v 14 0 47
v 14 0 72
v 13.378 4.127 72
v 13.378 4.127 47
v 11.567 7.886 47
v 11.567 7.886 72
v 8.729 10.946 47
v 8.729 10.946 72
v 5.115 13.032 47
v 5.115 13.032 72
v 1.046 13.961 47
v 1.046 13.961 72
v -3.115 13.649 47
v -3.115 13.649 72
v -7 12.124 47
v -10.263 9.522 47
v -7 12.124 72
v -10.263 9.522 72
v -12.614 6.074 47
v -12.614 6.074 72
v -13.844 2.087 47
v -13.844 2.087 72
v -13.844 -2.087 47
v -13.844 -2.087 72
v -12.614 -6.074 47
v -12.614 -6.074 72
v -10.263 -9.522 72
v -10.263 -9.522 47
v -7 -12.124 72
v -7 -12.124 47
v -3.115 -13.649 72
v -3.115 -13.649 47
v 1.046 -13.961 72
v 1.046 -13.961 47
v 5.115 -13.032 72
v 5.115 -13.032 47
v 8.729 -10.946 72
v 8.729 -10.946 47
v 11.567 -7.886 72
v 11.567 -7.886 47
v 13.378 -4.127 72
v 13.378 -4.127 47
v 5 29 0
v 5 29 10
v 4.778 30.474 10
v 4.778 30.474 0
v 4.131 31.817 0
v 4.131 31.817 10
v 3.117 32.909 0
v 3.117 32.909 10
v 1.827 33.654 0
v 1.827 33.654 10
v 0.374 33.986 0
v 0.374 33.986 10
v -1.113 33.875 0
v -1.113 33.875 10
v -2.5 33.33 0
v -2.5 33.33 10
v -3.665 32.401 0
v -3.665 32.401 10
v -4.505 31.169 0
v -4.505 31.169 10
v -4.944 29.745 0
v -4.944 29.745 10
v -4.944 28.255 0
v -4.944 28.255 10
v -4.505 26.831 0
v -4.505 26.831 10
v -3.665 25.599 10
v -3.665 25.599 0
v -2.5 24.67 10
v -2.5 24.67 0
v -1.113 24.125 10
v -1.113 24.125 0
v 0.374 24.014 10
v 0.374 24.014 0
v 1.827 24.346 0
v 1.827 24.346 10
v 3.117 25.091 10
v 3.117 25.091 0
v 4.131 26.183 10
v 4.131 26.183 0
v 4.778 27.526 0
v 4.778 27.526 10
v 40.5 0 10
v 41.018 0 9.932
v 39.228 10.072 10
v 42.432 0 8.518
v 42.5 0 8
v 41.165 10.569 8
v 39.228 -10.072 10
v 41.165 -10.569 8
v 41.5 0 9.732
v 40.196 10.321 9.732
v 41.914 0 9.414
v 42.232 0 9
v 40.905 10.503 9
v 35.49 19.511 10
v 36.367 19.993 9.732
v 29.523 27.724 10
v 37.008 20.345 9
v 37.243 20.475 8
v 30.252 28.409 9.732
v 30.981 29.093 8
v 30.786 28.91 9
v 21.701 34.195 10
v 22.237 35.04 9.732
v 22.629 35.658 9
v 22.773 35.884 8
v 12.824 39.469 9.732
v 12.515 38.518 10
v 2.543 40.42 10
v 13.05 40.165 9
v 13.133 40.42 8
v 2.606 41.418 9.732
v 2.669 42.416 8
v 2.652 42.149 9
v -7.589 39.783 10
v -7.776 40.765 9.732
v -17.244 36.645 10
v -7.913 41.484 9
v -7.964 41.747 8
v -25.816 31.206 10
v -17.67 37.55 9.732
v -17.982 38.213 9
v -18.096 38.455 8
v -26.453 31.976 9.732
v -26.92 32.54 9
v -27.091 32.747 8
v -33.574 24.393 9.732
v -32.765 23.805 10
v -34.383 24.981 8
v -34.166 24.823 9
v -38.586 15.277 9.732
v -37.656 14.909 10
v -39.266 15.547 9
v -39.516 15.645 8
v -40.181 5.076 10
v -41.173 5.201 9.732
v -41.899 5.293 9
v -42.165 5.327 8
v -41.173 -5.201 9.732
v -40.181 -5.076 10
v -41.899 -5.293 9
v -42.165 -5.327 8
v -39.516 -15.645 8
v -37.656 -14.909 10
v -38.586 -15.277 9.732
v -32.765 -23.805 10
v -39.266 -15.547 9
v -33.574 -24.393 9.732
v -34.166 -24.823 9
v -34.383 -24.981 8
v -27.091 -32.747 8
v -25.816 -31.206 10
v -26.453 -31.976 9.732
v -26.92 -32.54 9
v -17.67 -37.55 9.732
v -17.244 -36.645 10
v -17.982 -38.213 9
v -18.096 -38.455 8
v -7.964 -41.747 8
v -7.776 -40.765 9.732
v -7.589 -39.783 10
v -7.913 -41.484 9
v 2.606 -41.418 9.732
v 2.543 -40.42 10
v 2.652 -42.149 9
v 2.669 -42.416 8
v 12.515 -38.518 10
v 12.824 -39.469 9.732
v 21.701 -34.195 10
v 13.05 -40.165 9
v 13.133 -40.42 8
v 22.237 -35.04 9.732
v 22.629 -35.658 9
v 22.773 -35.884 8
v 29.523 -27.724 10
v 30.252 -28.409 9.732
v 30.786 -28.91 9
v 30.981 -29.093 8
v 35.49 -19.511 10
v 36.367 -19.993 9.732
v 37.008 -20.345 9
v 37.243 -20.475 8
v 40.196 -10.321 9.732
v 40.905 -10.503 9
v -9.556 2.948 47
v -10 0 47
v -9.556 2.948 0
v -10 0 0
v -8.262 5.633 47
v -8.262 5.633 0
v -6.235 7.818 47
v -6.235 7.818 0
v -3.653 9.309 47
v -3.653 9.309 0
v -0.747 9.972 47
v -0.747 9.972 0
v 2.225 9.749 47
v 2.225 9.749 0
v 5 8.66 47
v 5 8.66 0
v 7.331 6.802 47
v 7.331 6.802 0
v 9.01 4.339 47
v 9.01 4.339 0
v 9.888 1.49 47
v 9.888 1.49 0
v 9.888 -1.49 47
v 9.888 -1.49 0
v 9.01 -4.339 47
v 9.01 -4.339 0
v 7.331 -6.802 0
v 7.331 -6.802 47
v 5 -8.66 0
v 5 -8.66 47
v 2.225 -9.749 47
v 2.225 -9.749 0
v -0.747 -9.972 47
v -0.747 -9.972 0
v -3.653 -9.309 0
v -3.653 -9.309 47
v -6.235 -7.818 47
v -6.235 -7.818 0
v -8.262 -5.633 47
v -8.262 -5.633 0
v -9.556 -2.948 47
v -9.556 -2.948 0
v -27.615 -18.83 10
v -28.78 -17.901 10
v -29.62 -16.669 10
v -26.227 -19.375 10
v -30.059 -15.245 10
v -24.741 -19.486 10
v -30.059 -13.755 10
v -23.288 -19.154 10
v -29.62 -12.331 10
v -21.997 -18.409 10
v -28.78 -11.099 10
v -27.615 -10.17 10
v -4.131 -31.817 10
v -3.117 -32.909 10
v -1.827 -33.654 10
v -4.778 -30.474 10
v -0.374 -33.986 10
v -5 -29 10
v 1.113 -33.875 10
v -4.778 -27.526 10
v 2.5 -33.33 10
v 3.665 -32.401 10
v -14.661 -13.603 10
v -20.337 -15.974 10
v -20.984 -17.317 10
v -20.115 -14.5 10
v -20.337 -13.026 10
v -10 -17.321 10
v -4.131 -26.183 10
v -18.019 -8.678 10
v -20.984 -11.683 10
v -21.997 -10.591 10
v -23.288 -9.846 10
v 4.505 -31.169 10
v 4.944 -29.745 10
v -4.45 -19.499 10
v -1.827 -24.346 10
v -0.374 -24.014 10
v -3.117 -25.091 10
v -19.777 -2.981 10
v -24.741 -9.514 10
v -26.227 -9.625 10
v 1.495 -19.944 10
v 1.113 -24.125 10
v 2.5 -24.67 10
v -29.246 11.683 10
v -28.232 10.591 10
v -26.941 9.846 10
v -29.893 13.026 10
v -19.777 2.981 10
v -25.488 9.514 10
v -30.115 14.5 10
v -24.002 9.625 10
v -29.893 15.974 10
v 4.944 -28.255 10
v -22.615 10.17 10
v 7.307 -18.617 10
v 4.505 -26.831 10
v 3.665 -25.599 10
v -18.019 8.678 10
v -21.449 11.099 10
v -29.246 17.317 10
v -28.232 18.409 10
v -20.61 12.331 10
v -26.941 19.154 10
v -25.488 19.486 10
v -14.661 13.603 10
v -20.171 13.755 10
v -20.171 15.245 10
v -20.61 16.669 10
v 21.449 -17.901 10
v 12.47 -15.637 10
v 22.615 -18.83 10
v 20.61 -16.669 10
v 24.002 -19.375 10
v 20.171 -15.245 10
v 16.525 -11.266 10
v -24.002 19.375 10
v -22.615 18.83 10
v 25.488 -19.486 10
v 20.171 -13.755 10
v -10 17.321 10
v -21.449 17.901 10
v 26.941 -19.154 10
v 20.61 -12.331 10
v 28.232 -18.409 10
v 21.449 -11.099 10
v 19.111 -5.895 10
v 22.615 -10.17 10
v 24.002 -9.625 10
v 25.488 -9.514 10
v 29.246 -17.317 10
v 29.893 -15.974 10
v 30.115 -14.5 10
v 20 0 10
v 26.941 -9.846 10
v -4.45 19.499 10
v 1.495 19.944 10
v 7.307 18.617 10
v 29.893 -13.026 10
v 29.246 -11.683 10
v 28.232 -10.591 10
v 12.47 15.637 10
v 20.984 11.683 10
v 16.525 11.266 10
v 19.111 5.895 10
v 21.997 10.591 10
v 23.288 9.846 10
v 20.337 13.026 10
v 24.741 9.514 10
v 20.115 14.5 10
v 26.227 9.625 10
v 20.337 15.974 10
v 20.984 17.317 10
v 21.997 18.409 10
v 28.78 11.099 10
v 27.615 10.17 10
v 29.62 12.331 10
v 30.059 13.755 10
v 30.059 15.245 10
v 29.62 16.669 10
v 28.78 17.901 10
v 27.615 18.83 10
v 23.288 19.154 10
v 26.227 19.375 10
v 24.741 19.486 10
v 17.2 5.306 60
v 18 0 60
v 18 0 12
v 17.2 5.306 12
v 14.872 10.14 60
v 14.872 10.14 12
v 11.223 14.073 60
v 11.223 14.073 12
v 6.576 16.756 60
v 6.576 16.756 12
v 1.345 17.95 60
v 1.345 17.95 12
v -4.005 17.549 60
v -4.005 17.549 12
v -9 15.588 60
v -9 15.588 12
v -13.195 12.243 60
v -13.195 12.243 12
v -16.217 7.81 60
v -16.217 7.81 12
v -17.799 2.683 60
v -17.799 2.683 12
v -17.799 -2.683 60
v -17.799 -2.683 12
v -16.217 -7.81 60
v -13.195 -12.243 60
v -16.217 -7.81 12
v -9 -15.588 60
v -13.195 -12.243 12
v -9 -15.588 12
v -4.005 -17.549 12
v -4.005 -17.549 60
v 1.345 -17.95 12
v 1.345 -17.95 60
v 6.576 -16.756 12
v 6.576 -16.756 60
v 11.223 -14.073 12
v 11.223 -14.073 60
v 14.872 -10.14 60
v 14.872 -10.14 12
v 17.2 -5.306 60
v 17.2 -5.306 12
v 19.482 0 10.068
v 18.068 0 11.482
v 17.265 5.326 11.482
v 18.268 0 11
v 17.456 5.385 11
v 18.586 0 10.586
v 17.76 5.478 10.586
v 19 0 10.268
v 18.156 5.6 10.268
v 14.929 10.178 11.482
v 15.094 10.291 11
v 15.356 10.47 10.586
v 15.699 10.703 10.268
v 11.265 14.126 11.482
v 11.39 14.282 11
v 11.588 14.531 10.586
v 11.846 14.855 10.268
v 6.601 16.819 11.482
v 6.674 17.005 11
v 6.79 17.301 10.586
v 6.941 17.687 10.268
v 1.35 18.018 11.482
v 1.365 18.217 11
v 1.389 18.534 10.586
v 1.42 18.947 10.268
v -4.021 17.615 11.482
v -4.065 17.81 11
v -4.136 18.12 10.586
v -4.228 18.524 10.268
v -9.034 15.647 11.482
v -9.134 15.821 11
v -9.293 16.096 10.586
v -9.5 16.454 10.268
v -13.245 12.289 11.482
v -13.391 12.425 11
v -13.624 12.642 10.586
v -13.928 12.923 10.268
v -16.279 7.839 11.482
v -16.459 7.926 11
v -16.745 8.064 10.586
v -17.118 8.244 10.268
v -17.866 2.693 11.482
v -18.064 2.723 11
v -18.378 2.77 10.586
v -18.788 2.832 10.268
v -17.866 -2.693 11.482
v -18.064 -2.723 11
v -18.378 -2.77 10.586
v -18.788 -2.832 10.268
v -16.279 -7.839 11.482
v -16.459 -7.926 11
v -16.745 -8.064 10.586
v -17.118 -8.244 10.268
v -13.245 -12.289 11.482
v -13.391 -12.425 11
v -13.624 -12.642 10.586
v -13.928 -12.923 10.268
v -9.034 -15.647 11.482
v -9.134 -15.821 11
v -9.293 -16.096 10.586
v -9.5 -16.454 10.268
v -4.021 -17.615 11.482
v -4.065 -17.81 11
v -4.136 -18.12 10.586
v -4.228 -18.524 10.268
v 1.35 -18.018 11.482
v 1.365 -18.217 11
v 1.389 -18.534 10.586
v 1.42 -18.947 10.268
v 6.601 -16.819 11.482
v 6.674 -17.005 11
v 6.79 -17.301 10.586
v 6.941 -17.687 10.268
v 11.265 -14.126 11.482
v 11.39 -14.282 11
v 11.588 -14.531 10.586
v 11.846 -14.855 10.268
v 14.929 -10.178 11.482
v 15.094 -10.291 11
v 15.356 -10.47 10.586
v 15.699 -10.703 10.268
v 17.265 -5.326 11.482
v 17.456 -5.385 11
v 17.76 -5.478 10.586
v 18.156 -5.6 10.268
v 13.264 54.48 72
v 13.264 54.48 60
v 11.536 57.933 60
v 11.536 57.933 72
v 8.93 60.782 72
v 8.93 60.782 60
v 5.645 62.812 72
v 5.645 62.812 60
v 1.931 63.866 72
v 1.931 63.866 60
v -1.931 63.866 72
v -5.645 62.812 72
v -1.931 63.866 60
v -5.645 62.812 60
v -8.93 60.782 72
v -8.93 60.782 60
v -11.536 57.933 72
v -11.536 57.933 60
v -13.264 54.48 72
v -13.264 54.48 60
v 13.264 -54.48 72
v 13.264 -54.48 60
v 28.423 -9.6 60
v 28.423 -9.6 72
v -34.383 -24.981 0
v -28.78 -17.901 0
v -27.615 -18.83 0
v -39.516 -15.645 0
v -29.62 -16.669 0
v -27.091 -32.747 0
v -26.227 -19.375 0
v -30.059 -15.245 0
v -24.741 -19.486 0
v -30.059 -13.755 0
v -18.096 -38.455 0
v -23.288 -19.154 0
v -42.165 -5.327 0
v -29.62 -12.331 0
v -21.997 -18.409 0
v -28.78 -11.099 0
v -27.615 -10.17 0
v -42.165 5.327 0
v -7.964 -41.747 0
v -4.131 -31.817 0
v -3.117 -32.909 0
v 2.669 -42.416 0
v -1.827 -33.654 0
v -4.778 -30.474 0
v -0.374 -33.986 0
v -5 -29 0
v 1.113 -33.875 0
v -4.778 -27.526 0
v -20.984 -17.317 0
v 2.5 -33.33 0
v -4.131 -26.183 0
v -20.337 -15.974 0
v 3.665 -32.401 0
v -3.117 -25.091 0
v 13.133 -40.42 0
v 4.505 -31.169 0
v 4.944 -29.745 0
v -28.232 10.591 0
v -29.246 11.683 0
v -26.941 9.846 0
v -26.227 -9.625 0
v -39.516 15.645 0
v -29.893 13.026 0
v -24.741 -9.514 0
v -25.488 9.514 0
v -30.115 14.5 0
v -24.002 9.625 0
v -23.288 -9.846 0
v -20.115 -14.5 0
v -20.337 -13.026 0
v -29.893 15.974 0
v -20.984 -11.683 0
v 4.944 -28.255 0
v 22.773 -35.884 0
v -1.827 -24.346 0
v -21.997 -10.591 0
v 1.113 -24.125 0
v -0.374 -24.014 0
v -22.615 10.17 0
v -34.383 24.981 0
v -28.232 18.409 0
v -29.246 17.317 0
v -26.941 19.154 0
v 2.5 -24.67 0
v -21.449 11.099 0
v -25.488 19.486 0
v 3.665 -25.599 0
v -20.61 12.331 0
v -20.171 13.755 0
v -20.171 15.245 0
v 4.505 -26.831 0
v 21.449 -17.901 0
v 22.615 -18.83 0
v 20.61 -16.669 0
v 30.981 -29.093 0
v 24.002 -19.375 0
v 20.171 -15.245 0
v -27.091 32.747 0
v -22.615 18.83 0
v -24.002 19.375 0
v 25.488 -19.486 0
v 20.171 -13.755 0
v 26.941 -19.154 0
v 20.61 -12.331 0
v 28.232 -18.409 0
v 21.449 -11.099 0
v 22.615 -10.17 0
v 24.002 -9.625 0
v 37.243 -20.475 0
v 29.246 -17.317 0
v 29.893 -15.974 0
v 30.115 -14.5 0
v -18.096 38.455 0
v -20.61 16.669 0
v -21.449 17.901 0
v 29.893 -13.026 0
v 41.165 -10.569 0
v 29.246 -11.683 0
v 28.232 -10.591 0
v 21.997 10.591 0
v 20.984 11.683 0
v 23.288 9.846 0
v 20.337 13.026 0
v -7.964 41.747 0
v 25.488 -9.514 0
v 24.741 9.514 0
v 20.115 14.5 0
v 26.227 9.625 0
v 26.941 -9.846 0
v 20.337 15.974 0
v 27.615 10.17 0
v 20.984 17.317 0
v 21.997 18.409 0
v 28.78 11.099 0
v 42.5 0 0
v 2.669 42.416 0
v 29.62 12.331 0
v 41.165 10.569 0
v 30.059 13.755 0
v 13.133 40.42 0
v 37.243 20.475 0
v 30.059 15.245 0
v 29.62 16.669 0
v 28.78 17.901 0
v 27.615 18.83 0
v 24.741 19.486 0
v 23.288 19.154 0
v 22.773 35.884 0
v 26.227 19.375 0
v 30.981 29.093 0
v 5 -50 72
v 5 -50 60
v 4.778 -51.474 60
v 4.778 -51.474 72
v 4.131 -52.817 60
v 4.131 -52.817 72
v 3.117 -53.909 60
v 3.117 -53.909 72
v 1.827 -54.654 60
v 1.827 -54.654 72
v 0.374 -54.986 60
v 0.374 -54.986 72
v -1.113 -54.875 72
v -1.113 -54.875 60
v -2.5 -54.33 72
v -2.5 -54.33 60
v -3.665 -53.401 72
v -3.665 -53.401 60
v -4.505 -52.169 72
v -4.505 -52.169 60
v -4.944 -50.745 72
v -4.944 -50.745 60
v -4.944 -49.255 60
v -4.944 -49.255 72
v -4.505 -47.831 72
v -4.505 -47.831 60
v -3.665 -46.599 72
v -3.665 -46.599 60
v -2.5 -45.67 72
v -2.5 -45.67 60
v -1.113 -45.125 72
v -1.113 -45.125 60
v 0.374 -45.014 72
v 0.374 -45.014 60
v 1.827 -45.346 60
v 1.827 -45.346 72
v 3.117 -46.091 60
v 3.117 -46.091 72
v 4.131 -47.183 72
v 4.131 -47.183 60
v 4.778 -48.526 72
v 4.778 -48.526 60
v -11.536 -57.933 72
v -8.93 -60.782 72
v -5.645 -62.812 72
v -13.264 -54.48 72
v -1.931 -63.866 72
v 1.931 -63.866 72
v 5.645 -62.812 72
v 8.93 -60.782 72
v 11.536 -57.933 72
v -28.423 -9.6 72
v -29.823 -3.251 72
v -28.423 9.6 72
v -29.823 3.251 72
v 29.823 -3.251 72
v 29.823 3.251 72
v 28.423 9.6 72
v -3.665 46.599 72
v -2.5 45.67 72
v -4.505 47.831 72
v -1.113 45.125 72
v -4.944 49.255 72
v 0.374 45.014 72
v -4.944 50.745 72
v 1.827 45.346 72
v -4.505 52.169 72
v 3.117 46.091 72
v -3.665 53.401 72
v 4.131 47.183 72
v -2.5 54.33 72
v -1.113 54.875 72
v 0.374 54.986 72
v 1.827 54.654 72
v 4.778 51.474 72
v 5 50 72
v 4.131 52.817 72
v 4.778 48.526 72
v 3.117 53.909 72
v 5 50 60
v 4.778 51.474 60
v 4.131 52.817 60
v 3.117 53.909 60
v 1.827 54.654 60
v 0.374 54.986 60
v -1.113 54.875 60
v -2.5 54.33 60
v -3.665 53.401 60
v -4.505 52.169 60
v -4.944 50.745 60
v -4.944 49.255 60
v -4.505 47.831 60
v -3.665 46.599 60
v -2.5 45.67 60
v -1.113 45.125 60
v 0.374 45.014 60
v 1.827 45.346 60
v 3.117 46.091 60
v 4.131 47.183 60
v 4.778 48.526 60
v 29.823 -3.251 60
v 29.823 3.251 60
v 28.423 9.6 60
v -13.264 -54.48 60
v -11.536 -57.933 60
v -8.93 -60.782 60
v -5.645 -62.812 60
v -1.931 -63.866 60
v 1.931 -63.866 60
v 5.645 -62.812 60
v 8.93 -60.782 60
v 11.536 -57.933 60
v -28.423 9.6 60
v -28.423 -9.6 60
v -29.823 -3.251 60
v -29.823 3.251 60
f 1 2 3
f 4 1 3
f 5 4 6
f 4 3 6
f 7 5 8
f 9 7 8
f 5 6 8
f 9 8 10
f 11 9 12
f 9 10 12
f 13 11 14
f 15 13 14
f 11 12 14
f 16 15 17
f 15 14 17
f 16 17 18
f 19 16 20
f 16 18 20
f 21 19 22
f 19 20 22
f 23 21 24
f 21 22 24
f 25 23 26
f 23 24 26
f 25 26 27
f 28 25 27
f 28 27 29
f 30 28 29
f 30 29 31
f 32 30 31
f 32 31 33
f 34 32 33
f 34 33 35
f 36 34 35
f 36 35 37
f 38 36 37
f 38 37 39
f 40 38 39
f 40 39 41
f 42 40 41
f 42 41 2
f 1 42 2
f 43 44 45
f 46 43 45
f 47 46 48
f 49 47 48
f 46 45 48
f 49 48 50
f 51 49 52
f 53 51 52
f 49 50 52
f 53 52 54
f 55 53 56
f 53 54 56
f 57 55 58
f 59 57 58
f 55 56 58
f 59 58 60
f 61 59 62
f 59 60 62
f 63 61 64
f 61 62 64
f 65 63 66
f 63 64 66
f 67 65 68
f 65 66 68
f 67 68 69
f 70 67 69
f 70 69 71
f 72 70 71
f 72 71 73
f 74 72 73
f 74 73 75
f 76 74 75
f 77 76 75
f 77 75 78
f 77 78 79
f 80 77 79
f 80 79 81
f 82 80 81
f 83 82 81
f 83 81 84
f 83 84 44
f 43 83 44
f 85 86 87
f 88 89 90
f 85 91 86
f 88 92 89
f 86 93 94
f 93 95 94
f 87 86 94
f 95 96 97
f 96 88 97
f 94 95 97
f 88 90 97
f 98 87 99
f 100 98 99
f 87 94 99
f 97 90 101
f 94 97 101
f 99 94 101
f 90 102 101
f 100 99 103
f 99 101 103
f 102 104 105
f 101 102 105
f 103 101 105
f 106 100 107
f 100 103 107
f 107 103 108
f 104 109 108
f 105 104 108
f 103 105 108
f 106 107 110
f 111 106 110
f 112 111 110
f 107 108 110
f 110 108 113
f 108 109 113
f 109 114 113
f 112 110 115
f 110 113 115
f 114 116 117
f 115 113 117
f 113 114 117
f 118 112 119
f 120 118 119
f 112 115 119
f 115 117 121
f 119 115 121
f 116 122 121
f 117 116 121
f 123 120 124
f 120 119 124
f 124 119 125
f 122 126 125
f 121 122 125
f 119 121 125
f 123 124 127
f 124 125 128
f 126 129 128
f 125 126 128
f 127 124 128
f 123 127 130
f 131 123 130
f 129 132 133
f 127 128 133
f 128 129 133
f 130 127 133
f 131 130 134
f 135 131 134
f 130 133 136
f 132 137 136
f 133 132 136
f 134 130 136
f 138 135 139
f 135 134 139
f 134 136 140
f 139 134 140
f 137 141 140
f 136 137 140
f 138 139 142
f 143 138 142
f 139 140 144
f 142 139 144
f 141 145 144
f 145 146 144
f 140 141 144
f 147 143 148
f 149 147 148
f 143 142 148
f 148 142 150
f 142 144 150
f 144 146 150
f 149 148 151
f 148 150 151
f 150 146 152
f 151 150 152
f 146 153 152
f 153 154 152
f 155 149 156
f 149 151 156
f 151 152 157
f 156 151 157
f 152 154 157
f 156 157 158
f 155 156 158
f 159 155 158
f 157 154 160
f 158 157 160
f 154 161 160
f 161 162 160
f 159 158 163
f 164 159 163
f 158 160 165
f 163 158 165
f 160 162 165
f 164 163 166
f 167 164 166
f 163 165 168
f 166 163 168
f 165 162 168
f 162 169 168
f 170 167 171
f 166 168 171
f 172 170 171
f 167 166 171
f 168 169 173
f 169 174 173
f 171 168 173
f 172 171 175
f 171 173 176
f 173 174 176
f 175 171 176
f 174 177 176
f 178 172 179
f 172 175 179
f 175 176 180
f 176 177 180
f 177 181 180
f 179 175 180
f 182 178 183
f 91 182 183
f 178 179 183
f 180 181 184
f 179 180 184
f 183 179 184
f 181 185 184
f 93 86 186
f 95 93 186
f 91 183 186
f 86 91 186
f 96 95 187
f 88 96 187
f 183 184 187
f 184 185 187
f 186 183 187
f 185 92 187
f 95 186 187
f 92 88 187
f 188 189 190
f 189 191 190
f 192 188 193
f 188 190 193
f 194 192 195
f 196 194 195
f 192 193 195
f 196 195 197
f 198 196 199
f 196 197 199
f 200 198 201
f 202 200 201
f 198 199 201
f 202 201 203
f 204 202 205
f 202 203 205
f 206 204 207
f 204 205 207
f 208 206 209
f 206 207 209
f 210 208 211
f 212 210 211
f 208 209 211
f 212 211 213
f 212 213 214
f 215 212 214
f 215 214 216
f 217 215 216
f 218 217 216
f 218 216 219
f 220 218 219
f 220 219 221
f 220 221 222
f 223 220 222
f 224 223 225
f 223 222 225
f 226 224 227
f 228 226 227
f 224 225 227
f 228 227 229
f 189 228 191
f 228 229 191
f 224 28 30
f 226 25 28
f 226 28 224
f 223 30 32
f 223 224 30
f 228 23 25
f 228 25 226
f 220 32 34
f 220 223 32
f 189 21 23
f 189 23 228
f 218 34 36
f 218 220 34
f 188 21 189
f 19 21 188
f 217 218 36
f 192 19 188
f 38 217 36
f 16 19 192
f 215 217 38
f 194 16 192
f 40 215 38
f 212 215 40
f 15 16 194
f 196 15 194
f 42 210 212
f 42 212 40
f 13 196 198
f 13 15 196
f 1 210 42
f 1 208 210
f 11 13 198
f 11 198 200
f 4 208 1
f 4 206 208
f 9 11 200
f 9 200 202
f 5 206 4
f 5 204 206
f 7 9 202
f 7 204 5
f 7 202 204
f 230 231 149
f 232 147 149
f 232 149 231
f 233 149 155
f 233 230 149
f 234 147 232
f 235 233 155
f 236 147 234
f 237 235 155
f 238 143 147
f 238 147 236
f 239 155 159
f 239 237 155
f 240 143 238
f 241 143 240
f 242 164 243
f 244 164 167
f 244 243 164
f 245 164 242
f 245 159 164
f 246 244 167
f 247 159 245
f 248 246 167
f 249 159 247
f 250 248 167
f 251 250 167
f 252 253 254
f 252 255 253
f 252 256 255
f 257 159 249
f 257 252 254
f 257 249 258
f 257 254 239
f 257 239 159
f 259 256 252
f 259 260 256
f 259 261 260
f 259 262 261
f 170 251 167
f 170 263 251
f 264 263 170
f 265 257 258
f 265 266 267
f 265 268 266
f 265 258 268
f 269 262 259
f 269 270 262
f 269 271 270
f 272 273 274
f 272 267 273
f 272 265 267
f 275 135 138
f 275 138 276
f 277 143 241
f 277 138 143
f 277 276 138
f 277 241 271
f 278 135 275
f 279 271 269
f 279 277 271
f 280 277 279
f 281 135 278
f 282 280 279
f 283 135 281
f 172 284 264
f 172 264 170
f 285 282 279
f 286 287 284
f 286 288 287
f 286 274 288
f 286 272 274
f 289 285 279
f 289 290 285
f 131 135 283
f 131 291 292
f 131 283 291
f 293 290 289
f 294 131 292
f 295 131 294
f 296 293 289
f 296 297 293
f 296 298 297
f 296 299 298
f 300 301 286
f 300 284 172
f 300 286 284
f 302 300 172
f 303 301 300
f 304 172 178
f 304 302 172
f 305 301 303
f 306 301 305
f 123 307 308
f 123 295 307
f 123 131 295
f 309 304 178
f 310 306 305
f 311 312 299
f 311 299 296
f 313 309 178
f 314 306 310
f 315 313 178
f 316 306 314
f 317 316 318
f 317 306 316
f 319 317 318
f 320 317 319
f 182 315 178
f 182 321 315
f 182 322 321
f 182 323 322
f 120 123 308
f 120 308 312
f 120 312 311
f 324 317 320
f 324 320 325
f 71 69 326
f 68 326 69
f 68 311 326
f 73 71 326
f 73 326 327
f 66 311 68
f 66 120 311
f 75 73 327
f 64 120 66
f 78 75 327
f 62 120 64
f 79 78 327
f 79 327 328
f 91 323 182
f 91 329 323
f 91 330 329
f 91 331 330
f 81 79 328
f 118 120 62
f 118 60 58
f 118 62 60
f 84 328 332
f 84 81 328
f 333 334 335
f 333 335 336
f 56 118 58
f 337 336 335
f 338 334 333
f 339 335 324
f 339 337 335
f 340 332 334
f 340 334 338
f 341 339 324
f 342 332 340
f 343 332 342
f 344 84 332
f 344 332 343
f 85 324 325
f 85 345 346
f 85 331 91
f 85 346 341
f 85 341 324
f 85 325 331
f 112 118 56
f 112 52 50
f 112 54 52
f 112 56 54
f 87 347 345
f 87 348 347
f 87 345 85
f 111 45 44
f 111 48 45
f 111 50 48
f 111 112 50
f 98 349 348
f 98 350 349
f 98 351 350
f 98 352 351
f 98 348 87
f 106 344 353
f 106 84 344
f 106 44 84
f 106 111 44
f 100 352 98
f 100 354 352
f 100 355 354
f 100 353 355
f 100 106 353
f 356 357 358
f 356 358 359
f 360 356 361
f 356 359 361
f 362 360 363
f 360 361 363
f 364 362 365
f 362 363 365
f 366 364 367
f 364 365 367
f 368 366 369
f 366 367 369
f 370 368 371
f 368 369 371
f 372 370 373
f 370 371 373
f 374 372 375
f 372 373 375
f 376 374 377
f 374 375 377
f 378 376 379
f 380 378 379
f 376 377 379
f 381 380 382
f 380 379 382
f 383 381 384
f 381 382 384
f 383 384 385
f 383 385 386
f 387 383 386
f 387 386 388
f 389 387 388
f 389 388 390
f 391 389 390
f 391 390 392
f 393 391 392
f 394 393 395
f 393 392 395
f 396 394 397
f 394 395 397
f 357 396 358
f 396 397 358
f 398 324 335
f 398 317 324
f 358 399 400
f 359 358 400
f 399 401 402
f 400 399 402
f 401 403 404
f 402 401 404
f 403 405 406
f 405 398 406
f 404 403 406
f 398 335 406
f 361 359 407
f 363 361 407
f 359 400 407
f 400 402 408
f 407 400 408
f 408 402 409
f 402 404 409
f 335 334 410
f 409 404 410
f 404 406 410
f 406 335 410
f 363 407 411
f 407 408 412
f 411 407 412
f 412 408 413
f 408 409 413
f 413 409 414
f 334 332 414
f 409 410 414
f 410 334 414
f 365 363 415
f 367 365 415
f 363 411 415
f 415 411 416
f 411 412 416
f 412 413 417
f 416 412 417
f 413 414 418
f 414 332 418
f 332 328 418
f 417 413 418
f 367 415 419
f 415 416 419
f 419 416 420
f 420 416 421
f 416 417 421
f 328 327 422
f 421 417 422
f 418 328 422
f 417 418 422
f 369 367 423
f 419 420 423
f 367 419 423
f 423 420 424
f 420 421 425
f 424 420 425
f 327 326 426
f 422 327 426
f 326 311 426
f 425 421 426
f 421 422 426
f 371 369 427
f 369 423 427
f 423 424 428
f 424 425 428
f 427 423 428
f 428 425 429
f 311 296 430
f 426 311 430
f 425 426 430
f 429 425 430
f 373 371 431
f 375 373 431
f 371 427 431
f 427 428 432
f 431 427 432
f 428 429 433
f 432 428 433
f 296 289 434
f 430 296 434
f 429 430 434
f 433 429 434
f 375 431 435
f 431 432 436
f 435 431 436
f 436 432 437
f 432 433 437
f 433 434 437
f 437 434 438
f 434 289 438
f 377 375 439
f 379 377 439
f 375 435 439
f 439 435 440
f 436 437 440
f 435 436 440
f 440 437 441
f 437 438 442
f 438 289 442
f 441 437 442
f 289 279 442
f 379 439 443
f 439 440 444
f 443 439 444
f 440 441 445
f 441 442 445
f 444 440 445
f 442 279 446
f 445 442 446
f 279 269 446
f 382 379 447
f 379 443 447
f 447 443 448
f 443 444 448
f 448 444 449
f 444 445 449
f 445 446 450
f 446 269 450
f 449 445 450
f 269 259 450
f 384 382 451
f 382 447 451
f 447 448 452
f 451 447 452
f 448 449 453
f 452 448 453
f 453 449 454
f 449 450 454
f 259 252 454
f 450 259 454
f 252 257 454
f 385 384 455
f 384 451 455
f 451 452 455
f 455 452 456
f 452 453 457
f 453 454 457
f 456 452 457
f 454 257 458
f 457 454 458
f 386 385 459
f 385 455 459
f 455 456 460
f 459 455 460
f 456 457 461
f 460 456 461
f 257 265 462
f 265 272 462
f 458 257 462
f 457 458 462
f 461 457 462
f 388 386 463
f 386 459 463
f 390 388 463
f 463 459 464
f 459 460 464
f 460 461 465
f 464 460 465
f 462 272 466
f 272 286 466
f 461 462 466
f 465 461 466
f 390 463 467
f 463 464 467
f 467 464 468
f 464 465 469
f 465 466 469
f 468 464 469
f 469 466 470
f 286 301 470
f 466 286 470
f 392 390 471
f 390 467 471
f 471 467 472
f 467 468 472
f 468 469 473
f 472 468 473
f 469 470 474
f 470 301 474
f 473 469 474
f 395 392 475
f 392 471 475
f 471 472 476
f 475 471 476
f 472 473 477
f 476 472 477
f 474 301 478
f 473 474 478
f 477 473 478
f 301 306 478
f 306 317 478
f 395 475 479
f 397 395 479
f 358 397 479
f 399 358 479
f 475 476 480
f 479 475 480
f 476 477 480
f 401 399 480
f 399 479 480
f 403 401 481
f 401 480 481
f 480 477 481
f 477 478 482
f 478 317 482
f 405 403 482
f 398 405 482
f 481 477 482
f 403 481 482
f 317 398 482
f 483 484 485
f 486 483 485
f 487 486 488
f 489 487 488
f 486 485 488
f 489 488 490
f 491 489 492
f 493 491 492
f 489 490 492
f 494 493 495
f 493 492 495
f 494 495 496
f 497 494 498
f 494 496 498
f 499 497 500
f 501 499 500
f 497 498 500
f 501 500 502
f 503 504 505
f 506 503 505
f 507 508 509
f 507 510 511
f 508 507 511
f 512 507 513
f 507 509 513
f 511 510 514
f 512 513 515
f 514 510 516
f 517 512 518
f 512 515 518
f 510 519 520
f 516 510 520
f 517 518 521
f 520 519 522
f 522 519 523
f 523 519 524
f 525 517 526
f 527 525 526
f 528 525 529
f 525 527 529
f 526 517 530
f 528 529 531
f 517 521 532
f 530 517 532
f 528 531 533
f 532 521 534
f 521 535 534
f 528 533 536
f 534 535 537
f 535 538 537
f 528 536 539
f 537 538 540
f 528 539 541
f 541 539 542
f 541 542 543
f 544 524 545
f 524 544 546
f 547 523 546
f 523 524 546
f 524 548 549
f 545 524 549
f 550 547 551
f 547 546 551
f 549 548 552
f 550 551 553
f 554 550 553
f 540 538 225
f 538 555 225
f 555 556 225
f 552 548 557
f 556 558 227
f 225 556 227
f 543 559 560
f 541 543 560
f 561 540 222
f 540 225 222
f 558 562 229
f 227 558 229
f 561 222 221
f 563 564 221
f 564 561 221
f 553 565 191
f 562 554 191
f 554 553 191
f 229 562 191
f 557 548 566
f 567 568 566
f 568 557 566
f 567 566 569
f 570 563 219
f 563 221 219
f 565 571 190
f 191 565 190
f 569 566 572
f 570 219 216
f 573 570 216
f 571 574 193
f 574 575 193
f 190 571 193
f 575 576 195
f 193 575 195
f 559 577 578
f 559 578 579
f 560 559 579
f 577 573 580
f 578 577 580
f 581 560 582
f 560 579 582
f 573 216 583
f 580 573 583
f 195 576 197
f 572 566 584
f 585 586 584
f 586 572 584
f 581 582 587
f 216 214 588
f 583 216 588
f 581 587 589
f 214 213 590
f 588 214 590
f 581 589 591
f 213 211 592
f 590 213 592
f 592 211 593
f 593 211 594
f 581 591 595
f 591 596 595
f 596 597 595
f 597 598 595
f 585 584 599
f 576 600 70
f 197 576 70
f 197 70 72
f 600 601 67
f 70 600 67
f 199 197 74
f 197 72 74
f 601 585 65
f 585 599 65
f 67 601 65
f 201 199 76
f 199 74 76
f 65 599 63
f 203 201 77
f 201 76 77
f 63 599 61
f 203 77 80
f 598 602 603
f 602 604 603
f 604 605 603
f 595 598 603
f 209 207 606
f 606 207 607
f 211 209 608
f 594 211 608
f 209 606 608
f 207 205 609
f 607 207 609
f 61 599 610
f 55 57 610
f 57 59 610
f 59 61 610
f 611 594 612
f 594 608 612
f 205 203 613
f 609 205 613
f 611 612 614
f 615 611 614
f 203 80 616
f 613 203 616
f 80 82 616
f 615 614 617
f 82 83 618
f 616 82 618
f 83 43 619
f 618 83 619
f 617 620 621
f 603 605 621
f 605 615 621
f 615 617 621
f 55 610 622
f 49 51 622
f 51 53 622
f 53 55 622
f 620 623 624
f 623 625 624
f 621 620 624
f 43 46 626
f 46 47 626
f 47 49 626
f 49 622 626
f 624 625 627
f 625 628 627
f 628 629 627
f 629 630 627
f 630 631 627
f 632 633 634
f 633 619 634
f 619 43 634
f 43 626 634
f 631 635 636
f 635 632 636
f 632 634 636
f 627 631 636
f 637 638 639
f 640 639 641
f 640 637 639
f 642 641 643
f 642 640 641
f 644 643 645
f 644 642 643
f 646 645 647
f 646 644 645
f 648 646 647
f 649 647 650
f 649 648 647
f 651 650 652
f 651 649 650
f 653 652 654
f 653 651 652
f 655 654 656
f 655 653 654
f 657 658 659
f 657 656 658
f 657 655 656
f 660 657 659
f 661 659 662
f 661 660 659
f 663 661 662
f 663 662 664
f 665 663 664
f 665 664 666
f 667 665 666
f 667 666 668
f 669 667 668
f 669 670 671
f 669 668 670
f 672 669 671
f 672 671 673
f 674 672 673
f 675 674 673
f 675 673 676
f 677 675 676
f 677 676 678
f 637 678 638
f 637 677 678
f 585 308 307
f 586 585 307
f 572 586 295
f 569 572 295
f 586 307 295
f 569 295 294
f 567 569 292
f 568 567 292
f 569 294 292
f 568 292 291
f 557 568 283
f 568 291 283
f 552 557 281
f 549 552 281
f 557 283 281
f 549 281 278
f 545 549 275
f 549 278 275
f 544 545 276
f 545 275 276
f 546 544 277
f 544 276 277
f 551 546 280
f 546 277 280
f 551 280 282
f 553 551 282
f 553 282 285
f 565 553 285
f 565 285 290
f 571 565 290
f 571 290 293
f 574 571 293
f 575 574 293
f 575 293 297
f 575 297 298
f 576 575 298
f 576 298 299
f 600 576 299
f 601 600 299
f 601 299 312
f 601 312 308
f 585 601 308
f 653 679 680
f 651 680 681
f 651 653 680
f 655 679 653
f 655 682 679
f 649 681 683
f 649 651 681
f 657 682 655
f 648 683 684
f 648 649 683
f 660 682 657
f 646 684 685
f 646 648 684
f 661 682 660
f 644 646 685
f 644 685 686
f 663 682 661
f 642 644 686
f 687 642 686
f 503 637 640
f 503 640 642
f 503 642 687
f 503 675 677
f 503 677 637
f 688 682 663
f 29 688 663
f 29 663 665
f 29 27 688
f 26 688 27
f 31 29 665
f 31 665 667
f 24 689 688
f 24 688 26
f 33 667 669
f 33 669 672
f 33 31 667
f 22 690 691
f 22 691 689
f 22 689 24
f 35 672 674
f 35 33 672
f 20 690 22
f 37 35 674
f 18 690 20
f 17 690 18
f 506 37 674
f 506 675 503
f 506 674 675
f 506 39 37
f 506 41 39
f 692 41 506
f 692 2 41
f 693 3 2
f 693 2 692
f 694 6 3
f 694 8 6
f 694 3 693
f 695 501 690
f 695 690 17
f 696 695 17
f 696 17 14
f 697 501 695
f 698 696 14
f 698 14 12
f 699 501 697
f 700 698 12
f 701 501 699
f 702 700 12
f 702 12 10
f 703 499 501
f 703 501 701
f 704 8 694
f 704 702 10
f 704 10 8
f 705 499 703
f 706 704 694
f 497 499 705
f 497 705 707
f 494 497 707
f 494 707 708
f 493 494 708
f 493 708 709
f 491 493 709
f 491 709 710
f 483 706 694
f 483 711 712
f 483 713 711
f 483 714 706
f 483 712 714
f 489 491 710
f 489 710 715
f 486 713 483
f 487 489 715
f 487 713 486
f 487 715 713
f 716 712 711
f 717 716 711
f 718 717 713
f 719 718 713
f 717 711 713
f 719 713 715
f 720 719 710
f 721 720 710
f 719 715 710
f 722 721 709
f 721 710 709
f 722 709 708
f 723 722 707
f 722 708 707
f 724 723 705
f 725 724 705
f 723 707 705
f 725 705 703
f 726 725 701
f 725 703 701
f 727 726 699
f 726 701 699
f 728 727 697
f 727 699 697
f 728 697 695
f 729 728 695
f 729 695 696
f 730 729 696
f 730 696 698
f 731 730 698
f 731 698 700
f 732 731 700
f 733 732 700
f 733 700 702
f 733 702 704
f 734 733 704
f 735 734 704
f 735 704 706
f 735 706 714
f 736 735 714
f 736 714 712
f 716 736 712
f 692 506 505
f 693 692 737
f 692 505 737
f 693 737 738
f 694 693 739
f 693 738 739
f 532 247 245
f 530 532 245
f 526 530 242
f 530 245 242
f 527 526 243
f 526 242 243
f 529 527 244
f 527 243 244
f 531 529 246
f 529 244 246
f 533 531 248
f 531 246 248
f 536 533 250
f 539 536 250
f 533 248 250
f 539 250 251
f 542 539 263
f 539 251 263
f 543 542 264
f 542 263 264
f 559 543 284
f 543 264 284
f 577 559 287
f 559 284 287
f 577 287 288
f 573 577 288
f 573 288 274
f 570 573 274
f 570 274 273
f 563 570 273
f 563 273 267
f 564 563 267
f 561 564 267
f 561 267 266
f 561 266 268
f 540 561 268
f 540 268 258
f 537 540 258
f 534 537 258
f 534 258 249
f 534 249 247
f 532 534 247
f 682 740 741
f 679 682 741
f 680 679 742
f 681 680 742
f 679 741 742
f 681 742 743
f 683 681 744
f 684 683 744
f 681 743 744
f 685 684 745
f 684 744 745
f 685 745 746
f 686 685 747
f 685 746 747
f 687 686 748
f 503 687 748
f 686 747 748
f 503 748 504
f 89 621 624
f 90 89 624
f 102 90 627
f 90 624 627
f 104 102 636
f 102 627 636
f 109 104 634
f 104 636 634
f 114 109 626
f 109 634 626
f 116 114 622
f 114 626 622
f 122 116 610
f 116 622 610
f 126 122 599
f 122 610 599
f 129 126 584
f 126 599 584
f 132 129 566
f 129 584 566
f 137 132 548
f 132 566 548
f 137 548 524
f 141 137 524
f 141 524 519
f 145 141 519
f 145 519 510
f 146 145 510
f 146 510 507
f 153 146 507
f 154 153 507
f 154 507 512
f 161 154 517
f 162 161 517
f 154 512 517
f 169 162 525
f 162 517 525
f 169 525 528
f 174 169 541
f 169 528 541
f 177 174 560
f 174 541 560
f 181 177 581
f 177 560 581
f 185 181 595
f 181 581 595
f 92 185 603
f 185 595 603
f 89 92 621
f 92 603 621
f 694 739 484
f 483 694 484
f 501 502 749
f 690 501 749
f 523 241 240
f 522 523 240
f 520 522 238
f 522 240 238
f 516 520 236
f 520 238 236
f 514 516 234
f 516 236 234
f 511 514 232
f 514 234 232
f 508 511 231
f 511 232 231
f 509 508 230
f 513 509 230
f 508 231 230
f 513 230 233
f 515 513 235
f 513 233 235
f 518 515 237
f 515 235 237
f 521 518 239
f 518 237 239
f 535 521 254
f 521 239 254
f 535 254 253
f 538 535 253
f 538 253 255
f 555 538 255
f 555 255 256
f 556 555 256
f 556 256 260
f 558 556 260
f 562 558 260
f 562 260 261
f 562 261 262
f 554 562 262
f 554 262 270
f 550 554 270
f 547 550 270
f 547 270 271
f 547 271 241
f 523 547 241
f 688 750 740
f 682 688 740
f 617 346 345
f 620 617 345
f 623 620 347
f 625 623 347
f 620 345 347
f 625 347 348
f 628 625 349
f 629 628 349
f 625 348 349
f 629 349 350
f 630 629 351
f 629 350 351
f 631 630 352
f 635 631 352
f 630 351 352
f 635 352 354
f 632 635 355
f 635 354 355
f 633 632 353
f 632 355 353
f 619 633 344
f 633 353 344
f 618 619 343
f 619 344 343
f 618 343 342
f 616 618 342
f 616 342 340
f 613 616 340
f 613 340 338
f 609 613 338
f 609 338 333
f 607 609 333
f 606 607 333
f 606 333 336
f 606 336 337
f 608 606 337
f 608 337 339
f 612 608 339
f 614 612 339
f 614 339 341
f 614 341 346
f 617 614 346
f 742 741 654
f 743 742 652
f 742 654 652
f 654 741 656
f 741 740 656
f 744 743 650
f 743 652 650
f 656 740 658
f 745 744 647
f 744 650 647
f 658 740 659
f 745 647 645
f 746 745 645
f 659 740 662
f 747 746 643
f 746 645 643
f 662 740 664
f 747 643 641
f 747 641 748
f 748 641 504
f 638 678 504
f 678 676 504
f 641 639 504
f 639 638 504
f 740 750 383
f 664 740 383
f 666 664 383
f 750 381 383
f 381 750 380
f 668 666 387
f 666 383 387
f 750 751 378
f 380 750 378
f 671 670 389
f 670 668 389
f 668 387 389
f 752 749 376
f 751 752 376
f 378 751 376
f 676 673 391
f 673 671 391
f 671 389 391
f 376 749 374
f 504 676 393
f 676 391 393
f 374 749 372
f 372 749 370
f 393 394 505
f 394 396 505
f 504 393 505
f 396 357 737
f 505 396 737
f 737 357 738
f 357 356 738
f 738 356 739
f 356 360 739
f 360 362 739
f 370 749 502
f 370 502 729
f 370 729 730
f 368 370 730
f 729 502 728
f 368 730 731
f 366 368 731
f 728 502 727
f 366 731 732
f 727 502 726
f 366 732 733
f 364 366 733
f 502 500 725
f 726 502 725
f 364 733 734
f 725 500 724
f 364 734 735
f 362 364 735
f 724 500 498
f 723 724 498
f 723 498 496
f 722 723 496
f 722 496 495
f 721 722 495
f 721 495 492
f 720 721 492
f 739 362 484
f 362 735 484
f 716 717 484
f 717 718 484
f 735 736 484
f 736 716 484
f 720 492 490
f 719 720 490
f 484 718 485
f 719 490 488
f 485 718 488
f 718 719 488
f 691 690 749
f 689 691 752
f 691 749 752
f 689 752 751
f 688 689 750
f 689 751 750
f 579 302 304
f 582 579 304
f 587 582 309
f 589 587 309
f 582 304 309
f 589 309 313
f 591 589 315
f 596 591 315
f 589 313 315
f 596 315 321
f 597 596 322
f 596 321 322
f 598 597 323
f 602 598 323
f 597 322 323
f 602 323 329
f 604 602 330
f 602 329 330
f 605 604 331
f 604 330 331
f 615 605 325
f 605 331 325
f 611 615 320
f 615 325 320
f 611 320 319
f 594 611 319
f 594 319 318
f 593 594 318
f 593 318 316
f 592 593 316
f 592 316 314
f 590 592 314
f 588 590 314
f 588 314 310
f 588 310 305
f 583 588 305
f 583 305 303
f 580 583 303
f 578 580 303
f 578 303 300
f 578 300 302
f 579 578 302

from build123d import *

# Parameters (mm, degrees)
SKETCH1_R                                          = 42.5
BOSS_EXTRUDE1_DEPTH                                = 10
SKETCH2_R                                          = 5
CUT_EXTRUDE1_DEPTH                                 = 61.930288035
CIRPATTERN2_COUNT                                  = 6
SKETCH3_R                                          = 18
BOSS_EXTRUDE2_DEPTH                                = 50
BOSS_EXTRUDE3_DEPTH                                = 12
SKETCH5_R                                          = 5
CUT_EXTRUDE3_DEPTH                                 = 106.291262695
CBORE_FOR_M2_5_PAN_HEAD_MACHINE_SCREW1_D           = 20
CBORE_FOR_M2_5_PAN_HEAD_MACHINE_SCREW1_CBORE_D     = 28
CBORE_FOR_M2_5_PAN_HEAD_MACHINE_SCREW1_CBORE_DEPTH = 25
FILLET1_R                                          = 2


with BuildPart() as part:
    # Sketch1 → Boss-Extrude1 (new body)
    with BuildSketch(Plane.XY):
        Circle(SKETCH1_R)
    extrude(amount=BOSS_EXTRUDE1_DEPTH)

    # Sketch2 → Cut-Extrude1 (cut, through all)
    with BuildSketch(Plane.XY.offset(10)):
        with Locations((0, 29)):
            Circle(SKETCH2_R)
    cut_extrude1 = extrude(amount=-CUT_EXTRUDE1_DEPTH, mode=Mode.SUBTRACT)

    # CirPattern2: Cut-Extrude1 ×6 about axis
    cirpattern2_axis = Axis((0, 0, 0), (0, 0, 1))
    for i in range(1, CIRPATTERN2_COUNT):
        add(cut_extrude1.rotate(cirpattern2_axis, i * 360 / CIRPATTERN2_COUNT), mode=Mode.SUBTRACT)

    # Sketch3 → Boss-Extrude2 (add)
    with BuildSketch(Plane.XY.offset(10)):
        Circle(SKETCH3_R)
    extrude(amount=BOSS_EXTRUDE2_DEPTH)

    # Sketch4 → Boss-Extrude3 (add)
    with BuildSketch(Plane.XY.offset(60)):
        with BuildLine():
            Line((-13.263845596, 54.48), (-28.422526278, 9.6))
            ThreePointArc((-28.422526278, 9.6), (-30, 0), (-28.422526278, -9.6))
            Line((-28.422526278, -9.6), (-13.263845596, -54.48))
            ThreePointArc((-13.263845596, -54.48), (0, -64), (13.263845596, -54.48))
            Line((13.263845596, -54.48), (28.422526278, -9.6))
            ThreePointArc((28.422526278, -9.6), (30, 0), (28.422526278, 9.6))
            Line((28.422526278, 9.6), (13.263845596, 54.48))
            ThreePointArc((13.263845596, 54.48), (0, 64), (-13.263845596, 54.48))
        make_face()
    extrude(amount=BOSS_EXTRUDE3_DEPTH)

    # Sketch5 → Cut-Extrude3 (cut, through all)
    with BuildSketch(Plane.XY.offset(72)):
        with Locations((0, 50)):
            Circle(SKETCH5_R)
    cut_extrude3 = extrude(amount=-CUT_EXTRUDE3_DEPTH, mode=Mode.SUBTRACT)

    # Mirror1: Cut-Extrude3 across plane
    add(cut_extrude3.mirror(Plane.ZX), mode=Mode.SUBTRACT)

    # CBORE for M2.5 Pan Head Machine Screw1 (through all)
    with Locations(Plane.XY.offset(72)):
        with Locations((0, 0)):
            CounterBoreHole(CBORE_FOR_M2_5_PAN_HEAD_MACHINE_SCREW1_D / 2, CBORE_FOR_M2_5_PAN_HEAD_MACHINE_SCREW1_CBORE_D / 2, CBORE_FOR_M2_5_PAN_HEAD_MACHINE_SCREW1_CBORE_DEPTH)

    # Fillet1
    fillet1_edges = [part.edges().sort_by_distance(p)[0] for p in [
        (-18, 0, 10),
        (-42.5, 0, 10),
    ]]
    fillet(fillet1_edges, radius=FILLET1_R)


solid = part.part
